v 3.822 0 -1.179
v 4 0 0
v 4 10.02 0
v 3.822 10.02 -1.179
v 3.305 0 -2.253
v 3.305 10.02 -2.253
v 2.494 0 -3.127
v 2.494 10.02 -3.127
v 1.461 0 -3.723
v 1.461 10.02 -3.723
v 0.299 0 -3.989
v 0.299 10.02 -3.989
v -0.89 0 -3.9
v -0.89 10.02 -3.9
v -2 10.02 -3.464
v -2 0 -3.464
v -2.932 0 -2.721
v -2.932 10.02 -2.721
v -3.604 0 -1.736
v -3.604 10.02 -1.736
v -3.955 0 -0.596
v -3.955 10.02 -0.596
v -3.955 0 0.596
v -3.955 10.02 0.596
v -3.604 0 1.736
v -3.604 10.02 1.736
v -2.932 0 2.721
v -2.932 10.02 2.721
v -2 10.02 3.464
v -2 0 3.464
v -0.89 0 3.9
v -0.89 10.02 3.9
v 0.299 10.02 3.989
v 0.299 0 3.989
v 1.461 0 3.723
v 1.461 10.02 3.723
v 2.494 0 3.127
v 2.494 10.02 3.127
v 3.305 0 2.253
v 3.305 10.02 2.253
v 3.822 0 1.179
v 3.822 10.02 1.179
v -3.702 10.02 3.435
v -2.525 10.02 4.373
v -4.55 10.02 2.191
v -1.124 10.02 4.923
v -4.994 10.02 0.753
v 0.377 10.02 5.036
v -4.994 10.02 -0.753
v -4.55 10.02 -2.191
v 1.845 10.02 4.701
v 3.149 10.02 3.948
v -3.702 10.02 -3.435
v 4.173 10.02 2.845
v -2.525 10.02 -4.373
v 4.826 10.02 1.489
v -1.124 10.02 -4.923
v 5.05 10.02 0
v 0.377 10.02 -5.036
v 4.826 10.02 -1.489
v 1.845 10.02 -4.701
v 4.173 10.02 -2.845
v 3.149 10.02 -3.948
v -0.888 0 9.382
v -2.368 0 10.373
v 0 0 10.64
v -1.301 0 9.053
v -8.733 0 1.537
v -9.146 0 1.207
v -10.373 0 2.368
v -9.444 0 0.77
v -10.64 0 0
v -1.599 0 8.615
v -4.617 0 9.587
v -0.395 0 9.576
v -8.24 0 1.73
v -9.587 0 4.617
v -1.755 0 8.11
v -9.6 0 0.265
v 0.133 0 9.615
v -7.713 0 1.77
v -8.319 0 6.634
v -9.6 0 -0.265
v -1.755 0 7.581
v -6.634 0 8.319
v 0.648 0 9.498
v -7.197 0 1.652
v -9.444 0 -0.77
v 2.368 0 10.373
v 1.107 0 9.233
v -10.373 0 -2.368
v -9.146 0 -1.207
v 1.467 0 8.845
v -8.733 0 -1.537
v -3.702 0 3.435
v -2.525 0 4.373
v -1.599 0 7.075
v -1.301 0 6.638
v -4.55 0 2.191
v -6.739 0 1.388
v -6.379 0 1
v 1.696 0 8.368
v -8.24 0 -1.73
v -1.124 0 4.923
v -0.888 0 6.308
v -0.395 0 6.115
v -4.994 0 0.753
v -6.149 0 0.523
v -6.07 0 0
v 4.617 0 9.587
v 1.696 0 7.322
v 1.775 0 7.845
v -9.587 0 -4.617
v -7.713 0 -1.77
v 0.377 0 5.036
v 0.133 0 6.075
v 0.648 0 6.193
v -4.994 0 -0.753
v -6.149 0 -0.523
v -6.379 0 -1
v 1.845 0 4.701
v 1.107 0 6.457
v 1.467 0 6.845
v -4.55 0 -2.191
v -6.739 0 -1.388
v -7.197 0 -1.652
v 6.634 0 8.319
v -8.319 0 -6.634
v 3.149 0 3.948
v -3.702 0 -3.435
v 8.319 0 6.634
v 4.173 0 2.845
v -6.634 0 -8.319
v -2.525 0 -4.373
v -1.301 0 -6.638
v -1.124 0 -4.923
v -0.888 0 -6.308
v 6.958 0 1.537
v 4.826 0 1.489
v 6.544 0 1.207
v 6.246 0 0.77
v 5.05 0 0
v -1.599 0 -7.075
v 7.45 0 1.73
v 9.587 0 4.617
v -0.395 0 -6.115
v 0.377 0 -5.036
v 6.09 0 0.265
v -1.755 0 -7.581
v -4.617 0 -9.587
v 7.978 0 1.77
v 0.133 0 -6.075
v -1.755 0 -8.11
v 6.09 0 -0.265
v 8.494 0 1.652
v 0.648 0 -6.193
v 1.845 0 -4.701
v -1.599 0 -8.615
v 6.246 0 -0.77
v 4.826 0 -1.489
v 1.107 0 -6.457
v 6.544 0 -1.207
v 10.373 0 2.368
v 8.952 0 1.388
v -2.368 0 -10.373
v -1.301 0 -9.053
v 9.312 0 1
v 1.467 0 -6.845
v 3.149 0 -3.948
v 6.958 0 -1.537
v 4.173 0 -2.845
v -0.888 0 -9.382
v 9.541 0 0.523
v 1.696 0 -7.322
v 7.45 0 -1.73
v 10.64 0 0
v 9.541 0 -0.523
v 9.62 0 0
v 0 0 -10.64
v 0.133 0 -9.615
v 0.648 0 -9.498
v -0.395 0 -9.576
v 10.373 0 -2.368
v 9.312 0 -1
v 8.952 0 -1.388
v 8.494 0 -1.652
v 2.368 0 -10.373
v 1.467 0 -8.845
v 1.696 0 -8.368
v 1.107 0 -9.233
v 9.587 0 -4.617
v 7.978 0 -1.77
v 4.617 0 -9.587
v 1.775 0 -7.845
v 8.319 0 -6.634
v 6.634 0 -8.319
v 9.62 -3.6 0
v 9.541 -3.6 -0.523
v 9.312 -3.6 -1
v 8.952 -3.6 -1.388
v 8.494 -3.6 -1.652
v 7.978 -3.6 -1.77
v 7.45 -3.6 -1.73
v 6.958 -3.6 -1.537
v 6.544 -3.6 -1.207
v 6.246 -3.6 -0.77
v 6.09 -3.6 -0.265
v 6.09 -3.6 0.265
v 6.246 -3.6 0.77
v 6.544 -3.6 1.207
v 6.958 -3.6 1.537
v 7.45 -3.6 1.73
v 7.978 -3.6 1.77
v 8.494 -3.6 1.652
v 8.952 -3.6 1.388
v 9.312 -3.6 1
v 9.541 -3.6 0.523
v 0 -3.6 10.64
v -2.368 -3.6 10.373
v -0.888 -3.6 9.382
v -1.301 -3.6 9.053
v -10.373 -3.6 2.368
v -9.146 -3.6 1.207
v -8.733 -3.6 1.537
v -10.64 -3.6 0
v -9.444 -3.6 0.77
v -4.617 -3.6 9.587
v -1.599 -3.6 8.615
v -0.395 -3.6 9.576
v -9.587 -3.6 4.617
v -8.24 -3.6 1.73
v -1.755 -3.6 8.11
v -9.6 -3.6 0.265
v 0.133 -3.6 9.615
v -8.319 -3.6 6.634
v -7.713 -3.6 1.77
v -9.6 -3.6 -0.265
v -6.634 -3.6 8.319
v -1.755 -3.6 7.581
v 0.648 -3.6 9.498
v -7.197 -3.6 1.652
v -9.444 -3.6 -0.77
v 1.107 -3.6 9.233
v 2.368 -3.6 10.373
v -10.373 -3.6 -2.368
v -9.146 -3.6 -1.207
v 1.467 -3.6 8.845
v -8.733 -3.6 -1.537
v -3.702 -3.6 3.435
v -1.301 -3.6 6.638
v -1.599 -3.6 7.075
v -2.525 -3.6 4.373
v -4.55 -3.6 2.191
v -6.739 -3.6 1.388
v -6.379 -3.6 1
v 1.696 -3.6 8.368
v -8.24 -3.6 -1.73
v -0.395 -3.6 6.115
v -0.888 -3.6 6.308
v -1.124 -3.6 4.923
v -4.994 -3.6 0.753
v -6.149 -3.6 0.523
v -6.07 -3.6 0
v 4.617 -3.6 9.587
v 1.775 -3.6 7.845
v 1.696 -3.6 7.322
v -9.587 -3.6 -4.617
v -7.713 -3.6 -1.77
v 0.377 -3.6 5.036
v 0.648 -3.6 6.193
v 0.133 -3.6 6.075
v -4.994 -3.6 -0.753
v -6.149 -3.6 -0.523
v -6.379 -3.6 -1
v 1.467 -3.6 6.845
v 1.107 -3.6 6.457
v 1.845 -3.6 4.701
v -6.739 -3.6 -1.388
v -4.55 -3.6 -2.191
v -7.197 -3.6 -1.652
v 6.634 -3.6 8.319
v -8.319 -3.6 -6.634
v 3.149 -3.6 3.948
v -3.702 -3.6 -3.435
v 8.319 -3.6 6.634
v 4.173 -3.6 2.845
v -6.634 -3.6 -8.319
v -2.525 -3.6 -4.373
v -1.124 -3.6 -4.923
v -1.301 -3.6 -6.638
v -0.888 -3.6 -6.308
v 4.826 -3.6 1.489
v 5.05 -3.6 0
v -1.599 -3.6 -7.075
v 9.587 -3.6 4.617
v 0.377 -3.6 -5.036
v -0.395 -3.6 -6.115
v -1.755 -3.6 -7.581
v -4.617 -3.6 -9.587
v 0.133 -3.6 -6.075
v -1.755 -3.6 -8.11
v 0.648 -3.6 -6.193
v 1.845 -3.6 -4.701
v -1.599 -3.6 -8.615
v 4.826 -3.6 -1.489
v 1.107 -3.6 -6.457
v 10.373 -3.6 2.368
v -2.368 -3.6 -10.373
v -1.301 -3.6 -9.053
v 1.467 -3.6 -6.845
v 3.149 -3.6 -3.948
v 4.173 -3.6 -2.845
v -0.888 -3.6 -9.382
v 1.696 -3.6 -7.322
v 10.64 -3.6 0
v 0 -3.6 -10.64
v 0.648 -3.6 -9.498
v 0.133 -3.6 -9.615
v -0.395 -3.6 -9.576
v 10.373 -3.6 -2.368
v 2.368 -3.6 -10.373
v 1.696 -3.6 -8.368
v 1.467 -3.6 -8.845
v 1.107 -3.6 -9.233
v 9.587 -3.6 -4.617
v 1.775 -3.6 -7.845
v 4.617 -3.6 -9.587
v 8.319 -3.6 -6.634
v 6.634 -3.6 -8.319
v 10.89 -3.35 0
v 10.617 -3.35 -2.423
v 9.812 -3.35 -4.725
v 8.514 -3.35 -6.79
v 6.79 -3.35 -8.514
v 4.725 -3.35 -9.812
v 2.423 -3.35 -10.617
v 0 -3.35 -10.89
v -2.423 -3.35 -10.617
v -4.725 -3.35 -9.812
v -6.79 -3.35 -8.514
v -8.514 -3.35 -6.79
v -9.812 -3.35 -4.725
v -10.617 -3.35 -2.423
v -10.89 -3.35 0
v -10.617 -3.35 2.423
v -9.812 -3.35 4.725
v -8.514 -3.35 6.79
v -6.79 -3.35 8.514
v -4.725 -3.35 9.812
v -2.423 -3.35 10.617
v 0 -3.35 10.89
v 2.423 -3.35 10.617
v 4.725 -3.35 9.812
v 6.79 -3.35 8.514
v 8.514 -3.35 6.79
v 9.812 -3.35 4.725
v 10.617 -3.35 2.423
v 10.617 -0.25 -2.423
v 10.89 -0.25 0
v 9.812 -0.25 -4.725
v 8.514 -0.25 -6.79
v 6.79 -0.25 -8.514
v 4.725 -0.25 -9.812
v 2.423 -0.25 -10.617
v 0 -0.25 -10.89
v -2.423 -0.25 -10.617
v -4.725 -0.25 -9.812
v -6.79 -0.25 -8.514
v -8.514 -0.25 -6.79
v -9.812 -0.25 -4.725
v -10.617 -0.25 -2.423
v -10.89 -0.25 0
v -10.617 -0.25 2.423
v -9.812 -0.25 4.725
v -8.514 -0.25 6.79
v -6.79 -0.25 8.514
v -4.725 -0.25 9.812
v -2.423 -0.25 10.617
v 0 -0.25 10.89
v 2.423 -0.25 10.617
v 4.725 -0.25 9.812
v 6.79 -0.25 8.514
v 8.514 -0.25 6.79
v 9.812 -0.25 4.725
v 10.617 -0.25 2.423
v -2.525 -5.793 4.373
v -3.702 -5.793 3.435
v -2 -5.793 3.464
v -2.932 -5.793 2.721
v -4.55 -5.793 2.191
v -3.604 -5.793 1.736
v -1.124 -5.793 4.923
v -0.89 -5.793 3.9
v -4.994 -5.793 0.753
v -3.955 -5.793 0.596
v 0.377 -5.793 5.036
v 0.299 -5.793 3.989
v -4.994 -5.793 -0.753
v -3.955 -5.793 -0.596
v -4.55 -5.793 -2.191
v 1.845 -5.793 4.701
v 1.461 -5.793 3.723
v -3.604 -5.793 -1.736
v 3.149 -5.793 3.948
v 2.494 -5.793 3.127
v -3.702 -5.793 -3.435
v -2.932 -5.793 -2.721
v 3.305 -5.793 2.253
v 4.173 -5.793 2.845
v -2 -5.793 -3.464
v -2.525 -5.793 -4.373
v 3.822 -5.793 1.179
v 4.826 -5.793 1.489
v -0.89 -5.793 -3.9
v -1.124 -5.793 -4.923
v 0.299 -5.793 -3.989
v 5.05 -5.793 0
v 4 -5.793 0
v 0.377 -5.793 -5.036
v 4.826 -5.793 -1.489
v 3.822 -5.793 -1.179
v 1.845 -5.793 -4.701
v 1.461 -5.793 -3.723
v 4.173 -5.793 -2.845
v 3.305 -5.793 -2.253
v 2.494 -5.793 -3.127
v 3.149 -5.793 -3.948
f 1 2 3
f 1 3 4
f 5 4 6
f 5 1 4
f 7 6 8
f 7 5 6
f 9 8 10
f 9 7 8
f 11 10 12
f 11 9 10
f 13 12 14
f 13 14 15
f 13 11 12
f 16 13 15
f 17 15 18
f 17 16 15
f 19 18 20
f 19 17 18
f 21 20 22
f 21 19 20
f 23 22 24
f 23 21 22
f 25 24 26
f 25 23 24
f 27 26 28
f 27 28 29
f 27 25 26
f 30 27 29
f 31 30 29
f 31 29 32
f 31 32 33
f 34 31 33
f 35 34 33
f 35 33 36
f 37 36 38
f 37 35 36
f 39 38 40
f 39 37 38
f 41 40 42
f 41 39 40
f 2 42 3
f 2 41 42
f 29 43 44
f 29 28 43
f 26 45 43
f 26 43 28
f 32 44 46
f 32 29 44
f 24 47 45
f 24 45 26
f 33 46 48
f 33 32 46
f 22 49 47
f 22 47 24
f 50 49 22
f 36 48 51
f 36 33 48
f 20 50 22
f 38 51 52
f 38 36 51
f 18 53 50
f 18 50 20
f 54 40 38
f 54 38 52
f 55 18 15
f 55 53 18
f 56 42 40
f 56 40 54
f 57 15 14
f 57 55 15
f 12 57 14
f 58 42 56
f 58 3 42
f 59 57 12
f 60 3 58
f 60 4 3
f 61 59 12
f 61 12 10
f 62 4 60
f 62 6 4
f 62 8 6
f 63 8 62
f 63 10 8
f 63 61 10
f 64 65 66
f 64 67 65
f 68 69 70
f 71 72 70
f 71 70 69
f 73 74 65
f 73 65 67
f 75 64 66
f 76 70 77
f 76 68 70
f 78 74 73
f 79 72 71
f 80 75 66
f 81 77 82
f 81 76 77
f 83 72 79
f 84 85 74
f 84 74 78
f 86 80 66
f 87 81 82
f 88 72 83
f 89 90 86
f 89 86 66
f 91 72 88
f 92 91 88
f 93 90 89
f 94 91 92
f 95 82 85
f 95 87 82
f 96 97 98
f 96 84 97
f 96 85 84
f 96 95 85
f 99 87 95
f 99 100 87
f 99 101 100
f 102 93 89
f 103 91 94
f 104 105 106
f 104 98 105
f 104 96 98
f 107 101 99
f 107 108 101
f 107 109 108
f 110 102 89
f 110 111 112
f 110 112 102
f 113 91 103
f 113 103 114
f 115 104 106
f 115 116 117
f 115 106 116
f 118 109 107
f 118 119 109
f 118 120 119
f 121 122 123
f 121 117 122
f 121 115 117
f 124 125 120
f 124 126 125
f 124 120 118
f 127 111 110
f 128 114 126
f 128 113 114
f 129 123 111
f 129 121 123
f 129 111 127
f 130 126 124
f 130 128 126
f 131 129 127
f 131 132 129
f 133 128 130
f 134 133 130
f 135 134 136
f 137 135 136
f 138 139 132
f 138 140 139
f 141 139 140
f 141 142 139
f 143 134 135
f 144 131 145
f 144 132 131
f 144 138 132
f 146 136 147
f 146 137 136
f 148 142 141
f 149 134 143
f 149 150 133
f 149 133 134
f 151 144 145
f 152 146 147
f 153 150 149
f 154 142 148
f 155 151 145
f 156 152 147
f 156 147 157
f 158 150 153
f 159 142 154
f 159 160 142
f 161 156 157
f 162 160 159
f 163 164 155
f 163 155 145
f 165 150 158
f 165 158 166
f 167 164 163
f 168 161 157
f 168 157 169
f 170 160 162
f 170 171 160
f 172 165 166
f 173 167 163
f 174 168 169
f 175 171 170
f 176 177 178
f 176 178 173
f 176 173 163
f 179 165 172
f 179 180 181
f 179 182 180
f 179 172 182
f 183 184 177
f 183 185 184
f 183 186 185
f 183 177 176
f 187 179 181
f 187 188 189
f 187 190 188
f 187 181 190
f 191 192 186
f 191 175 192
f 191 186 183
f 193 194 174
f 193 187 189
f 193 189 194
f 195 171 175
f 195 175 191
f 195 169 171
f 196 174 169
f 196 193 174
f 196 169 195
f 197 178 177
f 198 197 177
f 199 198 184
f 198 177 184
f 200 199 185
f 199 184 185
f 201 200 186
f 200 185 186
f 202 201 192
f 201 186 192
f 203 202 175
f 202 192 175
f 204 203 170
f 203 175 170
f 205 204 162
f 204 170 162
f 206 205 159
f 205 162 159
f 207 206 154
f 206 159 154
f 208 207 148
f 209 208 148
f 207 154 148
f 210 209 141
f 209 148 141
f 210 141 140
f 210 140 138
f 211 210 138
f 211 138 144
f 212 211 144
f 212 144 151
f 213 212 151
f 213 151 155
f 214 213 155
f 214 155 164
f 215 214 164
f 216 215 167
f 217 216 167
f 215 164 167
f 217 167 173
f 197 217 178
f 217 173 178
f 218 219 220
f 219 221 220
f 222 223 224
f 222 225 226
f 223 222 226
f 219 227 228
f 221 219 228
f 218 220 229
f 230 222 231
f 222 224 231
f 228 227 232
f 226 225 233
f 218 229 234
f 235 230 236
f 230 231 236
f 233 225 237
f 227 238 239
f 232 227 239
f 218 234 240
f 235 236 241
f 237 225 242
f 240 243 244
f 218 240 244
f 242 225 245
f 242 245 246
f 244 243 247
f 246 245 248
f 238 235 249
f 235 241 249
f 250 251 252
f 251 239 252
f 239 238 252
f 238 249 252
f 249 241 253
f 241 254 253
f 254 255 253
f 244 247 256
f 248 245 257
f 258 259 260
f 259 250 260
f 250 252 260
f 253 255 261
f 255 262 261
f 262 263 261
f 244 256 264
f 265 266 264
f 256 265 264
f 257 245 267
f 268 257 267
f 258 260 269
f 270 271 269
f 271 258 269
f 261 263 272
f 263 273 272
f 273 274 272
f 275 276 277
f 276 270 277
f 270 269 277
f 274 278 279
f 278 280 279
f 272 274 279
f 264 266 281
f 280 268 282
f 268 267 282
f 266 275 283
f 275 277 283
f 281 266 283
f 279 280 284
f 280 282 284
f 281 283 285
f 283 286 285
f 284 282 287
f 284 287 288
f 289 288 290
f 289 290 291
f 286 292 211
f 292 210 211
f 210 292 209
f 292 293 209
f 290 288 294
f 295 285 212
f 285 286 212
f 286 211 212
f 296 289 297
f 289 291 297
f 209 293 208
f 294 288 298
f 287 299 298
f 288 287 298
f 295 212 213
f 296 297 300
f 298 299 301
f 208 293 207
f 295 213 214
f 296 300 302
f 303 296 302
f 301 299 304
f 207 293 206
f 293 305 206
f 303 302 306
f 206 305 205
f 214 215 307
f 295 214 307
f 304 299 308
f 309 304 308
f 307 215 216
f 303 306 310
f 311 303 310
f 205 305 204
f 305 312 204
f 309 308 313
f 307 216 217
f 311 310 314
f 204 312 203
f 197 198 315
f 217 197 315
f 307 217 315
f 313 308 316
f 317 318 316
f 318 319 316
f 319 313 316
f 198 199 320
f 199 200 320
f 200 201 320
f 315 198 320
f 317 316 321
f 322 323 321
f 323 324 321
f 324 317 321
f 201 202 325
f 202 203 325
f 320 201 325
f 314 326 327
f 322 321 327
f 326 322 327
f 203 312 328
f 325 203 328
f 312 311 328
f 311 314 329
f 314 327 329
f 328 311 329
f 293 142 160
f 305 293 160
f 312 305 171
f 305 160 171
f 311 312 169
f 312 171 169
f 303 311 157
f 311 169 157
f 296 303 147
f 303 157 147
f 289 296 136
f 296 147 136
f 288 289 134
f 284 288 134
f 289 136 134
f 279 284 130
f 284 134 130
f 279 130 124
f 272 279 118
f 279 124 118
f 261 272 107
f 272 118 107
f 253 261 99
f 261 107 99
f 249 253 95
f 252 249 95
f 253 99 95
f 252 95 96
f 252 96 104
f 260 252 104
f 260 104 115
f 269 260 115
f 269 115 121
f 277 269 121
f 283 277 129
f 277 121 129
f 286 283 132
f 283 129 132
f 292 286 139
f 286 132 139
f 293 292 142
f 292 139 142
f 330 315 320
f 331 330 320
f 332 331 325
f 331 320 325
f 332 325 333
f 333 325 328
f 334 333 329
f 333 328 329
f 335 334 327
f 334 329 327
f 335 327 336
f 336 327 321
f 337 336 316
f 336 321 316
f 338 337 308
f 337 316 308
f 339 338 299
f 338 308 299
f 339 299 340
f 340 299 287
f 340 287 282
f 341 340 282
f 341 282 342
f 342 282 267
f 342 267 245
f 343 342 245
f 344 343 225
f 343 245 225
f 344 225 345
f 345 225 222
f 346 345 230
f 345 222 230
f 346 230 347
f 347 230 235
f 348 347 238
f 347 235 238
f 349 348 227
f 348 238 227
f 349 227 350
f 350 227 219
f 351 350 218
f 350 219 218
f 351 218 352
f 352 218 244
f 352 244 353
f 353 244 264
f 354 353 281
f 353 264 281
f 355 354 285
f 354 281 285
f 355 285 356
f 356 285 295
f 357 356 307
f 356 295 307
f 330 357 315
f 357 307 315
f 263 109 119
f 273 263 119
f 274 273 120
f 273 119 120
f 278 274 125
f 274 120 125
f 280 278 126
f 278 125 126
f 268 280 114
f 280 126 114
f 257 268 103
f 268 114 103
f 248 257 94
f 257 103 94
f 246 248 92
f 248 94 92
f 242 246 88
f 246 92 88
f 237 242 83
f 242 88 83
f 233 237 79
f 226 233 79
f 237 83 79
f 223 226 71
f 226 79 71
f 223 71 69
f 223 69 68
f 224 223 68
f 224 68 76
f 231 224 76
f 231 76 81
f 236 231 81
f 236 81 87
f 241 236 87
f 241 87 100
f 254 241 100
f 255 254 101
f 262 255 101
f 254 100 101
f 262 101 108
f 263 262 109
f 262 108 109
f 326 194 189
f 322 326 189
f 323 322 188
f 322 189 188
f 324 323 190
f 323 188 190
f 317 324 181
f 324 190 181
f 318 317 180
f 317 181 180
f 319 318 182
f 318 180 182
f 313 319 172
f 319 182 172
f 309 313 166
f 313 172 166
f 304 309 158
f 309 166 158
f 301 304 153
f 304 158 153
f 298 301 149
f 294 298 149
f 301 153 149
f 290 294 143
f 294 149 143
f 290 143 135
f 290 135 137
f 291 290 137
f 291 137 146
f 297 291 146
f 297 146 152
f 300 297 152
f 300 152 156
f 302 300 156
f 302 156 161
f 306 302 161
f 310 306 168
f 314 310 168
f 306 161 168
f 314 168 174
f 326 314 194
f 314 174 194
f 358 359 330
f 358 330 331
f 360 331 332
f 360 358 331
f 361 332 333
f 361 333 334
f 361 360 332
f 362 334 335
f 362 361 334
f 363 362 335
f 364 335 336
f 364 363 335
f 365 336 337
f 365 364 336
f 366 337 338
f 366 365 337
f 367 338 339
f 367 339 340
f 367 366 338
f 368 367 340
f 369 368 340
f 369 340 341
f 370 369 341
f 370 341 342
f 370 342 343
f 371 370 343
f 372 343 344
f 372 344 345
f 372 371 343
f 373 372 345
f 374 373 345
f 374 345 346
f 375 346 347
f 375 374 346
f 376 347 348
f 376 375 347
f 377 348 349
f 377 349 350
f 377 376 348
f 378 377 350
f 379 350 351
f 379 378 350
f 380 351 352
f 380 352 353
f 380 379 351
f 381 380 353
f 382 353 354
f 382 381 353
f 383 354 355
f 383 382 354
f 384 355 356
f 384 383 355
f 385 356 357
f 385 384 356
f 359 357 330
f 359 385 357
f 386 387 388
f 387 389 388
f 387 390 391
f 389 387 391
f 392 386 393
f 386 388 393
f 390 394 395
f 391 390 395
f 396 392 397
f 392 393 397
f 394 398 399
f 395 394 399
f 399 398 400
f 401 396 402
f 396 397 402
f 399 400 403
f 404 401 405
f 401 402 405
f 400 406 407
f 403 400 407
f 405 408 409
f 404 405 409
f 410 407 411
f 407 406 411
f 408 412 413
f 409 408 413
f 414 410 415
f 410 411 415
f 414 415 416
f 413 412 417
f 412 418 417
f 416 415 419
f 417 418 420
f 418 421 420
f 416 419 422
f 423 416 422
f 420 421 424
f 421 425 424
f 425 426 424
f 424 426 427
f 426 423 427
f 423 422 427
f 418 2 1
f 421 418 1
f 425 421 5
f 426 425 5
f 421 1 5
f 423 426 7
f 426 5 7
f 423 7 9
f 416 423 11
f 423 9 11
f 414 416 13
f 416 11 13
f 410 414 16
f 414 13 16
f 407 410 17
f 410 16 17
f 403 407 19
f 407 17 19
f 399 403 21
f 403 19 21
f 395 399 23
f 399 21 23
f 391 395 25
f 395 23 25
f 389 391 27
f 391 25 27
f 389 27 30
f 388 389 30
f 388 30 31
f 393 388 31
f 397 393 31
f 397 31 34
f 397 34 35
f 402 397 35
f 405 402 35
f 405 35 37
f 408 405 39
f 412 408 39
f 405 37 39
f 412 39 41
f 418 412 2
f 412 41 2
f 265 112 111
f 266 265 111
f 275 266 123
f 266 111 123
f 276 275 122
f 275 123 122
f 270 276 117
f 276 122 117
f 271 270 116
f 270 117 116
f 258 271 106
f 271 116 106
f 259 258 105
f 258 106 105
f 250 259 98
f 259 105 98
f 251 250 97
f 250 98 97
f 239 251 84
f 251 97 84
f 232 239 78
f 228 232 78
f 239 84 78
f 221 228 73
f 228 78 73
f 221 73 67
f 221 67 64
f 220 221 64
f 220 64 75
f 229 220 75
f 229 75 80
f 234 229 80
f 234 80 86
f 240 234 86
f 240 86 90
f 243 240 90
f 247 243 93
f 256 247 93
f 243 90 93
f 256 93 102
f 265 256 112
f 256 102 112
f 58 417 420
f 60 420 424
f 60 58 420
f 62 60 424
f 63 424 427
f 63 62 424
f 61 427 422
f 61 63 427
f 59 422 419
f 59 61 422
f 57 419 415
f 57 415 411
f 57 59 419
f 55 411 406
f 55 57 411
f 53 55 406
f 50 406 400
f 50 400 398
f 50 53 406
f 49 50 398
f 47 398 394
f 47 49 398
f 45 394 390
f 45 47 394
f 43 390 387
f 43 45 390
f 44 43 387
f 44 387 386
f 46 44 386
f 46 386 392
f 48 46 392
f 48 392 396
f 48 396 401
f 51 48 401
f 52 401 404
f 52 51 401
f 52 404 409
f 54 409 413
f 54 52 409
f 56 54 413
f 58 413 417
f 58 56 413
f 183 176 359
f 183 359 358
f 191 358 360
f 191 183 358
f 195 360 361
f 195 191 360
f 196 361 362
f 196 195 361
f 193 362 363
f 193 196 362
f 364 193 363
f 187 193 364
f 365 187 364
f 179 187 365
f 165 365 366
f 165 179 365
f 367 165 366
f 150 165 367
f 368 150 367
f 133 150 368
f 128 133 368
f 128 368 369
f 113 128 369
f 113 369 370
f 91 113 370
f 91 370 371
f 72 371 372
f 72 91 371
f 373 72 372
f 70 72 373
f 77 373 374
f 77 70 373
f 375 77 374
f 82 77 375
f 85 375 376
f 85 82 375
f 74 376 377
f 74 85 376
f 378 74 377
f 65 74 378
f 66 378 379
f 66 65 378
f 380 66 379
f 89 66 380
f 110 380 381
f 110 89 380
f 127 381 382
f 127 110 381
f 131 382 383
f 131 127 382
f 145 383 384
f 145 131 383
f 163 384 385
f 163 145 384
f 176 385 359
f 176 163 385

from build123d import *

# Parameters (mm, degrees)
SKETCH1_R                = 10.89025
SKETCH1_R_2              = 1.775
SKETCH1_R_3              = 5.05
BOSS_EXTRUDE1_DEPTH      = 3.6
SKETCH1_3_R              = 5.05
SKETCH1_3_R_2            = 4
BOSS_EXTRUDE2_DEPTH      = 10.02
BOSS_EXTRUDE2_DEPTH_BACK = 5.7927
CHAMFER2_SIZE            = 0.250000008


with BuildPart() as part:
    # Sketch1 → Boss-Extrude1 (new body)
    with BuildSketch(Plane(origin=(0, 0, 0), x_dir=(1, 0, 0), z_dir=(0, 1, 0))):
        Circle(SKETCH1_R)
        with Locations((-7.84525, 0)):
            Circle(SKETCH1_R_2, mode=Mode.SUBTRACT)
        with Locations((0, -7.84525)):
            Circle(SKETCH1_R_2, mode=Mode.SUBTRACT)
        with Locations((7.84525, 0)):
            Circle(SKETCH1_R_2, mode=Mode.SUBTRACT)
        with Locations((0, 7.84525)):
            Circle(SKETCH1_R_2, mode=Mode.SUBTRACT)
        Circle(SKETCH1_R_3, mode=Mode.SUBTRACT)
    extrude(amount=-BOSS_EXTRUDE1_DEPTH)

    # Chamfer2
    chamfer2_edges = [part.edges().sort_by_distance(p)[0] for p in [
        (-10.89025, -3.6, 0),
        (-10.89025, 0, 0),
    ]]
    chamfer(chamfer2_edges, length=CHAMFER2_SIZE)


with BuildPart() as body_2:
    # Sketch1<3> → Boss-Extrude2 (new body, two sides)
    with BuildSketch(Plane(origin=(0, 0, 0), x_dir=(1, 0, 0), z_dir=(0, 1, 0))) as boss_extrude2_sk:
        Circle(SKETCH1_3_R)
        Circle(SKETCH1_3_R_2, mode=Mode.SUBTRACT)
    extrude(amount=BOSS_EXTRUDE2_DEPTH)
    extrude(boss_extrude2_sk.sketch, amount=-BOSS_EXTRUDE2_DEPTH_BACK)


solid = Compound([part.part, body_2.part])
